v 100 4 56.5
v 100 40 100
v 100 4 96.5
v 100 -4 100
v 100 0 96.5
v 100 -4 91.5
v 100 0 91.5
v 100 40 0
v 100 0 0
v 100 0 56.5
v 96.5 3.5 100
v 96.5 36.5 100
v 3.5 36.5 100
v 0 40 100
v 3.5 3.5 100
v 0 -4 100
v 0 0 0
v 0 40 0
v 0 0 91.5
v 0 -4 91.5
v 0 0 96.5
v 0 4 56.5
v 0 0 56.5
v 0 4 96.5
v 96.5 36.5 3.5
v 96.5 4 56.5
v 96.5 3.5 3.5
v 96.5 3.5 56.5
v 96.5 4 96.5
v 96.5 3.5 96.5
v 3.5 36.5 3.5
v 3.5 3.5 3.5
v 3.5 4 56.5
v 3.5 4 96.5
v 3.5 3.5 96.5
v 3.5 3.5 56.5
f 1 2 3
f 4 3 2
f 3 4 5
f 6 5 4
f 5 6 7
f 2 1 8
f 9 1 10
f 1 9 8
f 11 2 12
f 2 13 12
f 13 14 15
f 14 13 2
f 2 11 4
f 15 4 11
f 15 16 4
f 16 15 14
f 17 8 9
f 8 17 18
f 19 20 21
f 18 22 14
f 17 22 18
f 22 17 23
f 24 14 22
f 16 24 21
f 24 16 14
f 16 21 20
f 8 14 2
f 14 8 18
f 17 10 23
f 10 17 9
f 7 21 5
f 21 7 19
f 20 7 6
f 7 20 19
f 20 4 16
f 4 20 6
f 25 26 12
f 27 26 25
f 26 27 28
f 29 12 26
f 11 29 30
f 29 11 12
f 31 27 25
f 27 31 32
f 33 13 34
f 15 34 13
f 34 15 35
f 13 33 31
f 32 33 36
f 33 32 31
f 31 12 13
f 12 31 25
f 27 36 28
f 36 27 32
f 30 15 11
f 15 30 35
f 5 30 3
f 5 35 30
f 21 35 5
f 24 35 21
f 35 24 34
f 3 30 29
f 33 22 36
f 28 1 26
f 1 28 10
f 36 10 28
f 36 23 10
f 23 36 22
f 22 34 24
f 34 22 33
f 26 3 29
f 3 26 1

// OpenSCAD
$fa =.01;
$fs=.1;

basketDepth =40;
basketWidth = 100;
basketHeight=100;
clipHeight = 40;
clipThickness=4;
clipOverhang=5;
thinWallThickness=3.5;

twt=thinWallThickness;

difference(){
  union(){
    cube([basketWidth, basketDepth, basketHeight]);
    translate([0,-clipThickness,basketHeight-clipOverhang-twt])
      cube([basketWidth, clipThickness+2*twt, clipOverhang+twt]);
  }

  translate([twt,twt,twt]) cube([basketWidth, basketDepth, basketHeight]-twt*[2,2,0]);
  translate([0,0,basketHeight-clipHeight-twt])
    cube([basketWidth, clipThickness, clipHeight]);
}
%difference(){
}
